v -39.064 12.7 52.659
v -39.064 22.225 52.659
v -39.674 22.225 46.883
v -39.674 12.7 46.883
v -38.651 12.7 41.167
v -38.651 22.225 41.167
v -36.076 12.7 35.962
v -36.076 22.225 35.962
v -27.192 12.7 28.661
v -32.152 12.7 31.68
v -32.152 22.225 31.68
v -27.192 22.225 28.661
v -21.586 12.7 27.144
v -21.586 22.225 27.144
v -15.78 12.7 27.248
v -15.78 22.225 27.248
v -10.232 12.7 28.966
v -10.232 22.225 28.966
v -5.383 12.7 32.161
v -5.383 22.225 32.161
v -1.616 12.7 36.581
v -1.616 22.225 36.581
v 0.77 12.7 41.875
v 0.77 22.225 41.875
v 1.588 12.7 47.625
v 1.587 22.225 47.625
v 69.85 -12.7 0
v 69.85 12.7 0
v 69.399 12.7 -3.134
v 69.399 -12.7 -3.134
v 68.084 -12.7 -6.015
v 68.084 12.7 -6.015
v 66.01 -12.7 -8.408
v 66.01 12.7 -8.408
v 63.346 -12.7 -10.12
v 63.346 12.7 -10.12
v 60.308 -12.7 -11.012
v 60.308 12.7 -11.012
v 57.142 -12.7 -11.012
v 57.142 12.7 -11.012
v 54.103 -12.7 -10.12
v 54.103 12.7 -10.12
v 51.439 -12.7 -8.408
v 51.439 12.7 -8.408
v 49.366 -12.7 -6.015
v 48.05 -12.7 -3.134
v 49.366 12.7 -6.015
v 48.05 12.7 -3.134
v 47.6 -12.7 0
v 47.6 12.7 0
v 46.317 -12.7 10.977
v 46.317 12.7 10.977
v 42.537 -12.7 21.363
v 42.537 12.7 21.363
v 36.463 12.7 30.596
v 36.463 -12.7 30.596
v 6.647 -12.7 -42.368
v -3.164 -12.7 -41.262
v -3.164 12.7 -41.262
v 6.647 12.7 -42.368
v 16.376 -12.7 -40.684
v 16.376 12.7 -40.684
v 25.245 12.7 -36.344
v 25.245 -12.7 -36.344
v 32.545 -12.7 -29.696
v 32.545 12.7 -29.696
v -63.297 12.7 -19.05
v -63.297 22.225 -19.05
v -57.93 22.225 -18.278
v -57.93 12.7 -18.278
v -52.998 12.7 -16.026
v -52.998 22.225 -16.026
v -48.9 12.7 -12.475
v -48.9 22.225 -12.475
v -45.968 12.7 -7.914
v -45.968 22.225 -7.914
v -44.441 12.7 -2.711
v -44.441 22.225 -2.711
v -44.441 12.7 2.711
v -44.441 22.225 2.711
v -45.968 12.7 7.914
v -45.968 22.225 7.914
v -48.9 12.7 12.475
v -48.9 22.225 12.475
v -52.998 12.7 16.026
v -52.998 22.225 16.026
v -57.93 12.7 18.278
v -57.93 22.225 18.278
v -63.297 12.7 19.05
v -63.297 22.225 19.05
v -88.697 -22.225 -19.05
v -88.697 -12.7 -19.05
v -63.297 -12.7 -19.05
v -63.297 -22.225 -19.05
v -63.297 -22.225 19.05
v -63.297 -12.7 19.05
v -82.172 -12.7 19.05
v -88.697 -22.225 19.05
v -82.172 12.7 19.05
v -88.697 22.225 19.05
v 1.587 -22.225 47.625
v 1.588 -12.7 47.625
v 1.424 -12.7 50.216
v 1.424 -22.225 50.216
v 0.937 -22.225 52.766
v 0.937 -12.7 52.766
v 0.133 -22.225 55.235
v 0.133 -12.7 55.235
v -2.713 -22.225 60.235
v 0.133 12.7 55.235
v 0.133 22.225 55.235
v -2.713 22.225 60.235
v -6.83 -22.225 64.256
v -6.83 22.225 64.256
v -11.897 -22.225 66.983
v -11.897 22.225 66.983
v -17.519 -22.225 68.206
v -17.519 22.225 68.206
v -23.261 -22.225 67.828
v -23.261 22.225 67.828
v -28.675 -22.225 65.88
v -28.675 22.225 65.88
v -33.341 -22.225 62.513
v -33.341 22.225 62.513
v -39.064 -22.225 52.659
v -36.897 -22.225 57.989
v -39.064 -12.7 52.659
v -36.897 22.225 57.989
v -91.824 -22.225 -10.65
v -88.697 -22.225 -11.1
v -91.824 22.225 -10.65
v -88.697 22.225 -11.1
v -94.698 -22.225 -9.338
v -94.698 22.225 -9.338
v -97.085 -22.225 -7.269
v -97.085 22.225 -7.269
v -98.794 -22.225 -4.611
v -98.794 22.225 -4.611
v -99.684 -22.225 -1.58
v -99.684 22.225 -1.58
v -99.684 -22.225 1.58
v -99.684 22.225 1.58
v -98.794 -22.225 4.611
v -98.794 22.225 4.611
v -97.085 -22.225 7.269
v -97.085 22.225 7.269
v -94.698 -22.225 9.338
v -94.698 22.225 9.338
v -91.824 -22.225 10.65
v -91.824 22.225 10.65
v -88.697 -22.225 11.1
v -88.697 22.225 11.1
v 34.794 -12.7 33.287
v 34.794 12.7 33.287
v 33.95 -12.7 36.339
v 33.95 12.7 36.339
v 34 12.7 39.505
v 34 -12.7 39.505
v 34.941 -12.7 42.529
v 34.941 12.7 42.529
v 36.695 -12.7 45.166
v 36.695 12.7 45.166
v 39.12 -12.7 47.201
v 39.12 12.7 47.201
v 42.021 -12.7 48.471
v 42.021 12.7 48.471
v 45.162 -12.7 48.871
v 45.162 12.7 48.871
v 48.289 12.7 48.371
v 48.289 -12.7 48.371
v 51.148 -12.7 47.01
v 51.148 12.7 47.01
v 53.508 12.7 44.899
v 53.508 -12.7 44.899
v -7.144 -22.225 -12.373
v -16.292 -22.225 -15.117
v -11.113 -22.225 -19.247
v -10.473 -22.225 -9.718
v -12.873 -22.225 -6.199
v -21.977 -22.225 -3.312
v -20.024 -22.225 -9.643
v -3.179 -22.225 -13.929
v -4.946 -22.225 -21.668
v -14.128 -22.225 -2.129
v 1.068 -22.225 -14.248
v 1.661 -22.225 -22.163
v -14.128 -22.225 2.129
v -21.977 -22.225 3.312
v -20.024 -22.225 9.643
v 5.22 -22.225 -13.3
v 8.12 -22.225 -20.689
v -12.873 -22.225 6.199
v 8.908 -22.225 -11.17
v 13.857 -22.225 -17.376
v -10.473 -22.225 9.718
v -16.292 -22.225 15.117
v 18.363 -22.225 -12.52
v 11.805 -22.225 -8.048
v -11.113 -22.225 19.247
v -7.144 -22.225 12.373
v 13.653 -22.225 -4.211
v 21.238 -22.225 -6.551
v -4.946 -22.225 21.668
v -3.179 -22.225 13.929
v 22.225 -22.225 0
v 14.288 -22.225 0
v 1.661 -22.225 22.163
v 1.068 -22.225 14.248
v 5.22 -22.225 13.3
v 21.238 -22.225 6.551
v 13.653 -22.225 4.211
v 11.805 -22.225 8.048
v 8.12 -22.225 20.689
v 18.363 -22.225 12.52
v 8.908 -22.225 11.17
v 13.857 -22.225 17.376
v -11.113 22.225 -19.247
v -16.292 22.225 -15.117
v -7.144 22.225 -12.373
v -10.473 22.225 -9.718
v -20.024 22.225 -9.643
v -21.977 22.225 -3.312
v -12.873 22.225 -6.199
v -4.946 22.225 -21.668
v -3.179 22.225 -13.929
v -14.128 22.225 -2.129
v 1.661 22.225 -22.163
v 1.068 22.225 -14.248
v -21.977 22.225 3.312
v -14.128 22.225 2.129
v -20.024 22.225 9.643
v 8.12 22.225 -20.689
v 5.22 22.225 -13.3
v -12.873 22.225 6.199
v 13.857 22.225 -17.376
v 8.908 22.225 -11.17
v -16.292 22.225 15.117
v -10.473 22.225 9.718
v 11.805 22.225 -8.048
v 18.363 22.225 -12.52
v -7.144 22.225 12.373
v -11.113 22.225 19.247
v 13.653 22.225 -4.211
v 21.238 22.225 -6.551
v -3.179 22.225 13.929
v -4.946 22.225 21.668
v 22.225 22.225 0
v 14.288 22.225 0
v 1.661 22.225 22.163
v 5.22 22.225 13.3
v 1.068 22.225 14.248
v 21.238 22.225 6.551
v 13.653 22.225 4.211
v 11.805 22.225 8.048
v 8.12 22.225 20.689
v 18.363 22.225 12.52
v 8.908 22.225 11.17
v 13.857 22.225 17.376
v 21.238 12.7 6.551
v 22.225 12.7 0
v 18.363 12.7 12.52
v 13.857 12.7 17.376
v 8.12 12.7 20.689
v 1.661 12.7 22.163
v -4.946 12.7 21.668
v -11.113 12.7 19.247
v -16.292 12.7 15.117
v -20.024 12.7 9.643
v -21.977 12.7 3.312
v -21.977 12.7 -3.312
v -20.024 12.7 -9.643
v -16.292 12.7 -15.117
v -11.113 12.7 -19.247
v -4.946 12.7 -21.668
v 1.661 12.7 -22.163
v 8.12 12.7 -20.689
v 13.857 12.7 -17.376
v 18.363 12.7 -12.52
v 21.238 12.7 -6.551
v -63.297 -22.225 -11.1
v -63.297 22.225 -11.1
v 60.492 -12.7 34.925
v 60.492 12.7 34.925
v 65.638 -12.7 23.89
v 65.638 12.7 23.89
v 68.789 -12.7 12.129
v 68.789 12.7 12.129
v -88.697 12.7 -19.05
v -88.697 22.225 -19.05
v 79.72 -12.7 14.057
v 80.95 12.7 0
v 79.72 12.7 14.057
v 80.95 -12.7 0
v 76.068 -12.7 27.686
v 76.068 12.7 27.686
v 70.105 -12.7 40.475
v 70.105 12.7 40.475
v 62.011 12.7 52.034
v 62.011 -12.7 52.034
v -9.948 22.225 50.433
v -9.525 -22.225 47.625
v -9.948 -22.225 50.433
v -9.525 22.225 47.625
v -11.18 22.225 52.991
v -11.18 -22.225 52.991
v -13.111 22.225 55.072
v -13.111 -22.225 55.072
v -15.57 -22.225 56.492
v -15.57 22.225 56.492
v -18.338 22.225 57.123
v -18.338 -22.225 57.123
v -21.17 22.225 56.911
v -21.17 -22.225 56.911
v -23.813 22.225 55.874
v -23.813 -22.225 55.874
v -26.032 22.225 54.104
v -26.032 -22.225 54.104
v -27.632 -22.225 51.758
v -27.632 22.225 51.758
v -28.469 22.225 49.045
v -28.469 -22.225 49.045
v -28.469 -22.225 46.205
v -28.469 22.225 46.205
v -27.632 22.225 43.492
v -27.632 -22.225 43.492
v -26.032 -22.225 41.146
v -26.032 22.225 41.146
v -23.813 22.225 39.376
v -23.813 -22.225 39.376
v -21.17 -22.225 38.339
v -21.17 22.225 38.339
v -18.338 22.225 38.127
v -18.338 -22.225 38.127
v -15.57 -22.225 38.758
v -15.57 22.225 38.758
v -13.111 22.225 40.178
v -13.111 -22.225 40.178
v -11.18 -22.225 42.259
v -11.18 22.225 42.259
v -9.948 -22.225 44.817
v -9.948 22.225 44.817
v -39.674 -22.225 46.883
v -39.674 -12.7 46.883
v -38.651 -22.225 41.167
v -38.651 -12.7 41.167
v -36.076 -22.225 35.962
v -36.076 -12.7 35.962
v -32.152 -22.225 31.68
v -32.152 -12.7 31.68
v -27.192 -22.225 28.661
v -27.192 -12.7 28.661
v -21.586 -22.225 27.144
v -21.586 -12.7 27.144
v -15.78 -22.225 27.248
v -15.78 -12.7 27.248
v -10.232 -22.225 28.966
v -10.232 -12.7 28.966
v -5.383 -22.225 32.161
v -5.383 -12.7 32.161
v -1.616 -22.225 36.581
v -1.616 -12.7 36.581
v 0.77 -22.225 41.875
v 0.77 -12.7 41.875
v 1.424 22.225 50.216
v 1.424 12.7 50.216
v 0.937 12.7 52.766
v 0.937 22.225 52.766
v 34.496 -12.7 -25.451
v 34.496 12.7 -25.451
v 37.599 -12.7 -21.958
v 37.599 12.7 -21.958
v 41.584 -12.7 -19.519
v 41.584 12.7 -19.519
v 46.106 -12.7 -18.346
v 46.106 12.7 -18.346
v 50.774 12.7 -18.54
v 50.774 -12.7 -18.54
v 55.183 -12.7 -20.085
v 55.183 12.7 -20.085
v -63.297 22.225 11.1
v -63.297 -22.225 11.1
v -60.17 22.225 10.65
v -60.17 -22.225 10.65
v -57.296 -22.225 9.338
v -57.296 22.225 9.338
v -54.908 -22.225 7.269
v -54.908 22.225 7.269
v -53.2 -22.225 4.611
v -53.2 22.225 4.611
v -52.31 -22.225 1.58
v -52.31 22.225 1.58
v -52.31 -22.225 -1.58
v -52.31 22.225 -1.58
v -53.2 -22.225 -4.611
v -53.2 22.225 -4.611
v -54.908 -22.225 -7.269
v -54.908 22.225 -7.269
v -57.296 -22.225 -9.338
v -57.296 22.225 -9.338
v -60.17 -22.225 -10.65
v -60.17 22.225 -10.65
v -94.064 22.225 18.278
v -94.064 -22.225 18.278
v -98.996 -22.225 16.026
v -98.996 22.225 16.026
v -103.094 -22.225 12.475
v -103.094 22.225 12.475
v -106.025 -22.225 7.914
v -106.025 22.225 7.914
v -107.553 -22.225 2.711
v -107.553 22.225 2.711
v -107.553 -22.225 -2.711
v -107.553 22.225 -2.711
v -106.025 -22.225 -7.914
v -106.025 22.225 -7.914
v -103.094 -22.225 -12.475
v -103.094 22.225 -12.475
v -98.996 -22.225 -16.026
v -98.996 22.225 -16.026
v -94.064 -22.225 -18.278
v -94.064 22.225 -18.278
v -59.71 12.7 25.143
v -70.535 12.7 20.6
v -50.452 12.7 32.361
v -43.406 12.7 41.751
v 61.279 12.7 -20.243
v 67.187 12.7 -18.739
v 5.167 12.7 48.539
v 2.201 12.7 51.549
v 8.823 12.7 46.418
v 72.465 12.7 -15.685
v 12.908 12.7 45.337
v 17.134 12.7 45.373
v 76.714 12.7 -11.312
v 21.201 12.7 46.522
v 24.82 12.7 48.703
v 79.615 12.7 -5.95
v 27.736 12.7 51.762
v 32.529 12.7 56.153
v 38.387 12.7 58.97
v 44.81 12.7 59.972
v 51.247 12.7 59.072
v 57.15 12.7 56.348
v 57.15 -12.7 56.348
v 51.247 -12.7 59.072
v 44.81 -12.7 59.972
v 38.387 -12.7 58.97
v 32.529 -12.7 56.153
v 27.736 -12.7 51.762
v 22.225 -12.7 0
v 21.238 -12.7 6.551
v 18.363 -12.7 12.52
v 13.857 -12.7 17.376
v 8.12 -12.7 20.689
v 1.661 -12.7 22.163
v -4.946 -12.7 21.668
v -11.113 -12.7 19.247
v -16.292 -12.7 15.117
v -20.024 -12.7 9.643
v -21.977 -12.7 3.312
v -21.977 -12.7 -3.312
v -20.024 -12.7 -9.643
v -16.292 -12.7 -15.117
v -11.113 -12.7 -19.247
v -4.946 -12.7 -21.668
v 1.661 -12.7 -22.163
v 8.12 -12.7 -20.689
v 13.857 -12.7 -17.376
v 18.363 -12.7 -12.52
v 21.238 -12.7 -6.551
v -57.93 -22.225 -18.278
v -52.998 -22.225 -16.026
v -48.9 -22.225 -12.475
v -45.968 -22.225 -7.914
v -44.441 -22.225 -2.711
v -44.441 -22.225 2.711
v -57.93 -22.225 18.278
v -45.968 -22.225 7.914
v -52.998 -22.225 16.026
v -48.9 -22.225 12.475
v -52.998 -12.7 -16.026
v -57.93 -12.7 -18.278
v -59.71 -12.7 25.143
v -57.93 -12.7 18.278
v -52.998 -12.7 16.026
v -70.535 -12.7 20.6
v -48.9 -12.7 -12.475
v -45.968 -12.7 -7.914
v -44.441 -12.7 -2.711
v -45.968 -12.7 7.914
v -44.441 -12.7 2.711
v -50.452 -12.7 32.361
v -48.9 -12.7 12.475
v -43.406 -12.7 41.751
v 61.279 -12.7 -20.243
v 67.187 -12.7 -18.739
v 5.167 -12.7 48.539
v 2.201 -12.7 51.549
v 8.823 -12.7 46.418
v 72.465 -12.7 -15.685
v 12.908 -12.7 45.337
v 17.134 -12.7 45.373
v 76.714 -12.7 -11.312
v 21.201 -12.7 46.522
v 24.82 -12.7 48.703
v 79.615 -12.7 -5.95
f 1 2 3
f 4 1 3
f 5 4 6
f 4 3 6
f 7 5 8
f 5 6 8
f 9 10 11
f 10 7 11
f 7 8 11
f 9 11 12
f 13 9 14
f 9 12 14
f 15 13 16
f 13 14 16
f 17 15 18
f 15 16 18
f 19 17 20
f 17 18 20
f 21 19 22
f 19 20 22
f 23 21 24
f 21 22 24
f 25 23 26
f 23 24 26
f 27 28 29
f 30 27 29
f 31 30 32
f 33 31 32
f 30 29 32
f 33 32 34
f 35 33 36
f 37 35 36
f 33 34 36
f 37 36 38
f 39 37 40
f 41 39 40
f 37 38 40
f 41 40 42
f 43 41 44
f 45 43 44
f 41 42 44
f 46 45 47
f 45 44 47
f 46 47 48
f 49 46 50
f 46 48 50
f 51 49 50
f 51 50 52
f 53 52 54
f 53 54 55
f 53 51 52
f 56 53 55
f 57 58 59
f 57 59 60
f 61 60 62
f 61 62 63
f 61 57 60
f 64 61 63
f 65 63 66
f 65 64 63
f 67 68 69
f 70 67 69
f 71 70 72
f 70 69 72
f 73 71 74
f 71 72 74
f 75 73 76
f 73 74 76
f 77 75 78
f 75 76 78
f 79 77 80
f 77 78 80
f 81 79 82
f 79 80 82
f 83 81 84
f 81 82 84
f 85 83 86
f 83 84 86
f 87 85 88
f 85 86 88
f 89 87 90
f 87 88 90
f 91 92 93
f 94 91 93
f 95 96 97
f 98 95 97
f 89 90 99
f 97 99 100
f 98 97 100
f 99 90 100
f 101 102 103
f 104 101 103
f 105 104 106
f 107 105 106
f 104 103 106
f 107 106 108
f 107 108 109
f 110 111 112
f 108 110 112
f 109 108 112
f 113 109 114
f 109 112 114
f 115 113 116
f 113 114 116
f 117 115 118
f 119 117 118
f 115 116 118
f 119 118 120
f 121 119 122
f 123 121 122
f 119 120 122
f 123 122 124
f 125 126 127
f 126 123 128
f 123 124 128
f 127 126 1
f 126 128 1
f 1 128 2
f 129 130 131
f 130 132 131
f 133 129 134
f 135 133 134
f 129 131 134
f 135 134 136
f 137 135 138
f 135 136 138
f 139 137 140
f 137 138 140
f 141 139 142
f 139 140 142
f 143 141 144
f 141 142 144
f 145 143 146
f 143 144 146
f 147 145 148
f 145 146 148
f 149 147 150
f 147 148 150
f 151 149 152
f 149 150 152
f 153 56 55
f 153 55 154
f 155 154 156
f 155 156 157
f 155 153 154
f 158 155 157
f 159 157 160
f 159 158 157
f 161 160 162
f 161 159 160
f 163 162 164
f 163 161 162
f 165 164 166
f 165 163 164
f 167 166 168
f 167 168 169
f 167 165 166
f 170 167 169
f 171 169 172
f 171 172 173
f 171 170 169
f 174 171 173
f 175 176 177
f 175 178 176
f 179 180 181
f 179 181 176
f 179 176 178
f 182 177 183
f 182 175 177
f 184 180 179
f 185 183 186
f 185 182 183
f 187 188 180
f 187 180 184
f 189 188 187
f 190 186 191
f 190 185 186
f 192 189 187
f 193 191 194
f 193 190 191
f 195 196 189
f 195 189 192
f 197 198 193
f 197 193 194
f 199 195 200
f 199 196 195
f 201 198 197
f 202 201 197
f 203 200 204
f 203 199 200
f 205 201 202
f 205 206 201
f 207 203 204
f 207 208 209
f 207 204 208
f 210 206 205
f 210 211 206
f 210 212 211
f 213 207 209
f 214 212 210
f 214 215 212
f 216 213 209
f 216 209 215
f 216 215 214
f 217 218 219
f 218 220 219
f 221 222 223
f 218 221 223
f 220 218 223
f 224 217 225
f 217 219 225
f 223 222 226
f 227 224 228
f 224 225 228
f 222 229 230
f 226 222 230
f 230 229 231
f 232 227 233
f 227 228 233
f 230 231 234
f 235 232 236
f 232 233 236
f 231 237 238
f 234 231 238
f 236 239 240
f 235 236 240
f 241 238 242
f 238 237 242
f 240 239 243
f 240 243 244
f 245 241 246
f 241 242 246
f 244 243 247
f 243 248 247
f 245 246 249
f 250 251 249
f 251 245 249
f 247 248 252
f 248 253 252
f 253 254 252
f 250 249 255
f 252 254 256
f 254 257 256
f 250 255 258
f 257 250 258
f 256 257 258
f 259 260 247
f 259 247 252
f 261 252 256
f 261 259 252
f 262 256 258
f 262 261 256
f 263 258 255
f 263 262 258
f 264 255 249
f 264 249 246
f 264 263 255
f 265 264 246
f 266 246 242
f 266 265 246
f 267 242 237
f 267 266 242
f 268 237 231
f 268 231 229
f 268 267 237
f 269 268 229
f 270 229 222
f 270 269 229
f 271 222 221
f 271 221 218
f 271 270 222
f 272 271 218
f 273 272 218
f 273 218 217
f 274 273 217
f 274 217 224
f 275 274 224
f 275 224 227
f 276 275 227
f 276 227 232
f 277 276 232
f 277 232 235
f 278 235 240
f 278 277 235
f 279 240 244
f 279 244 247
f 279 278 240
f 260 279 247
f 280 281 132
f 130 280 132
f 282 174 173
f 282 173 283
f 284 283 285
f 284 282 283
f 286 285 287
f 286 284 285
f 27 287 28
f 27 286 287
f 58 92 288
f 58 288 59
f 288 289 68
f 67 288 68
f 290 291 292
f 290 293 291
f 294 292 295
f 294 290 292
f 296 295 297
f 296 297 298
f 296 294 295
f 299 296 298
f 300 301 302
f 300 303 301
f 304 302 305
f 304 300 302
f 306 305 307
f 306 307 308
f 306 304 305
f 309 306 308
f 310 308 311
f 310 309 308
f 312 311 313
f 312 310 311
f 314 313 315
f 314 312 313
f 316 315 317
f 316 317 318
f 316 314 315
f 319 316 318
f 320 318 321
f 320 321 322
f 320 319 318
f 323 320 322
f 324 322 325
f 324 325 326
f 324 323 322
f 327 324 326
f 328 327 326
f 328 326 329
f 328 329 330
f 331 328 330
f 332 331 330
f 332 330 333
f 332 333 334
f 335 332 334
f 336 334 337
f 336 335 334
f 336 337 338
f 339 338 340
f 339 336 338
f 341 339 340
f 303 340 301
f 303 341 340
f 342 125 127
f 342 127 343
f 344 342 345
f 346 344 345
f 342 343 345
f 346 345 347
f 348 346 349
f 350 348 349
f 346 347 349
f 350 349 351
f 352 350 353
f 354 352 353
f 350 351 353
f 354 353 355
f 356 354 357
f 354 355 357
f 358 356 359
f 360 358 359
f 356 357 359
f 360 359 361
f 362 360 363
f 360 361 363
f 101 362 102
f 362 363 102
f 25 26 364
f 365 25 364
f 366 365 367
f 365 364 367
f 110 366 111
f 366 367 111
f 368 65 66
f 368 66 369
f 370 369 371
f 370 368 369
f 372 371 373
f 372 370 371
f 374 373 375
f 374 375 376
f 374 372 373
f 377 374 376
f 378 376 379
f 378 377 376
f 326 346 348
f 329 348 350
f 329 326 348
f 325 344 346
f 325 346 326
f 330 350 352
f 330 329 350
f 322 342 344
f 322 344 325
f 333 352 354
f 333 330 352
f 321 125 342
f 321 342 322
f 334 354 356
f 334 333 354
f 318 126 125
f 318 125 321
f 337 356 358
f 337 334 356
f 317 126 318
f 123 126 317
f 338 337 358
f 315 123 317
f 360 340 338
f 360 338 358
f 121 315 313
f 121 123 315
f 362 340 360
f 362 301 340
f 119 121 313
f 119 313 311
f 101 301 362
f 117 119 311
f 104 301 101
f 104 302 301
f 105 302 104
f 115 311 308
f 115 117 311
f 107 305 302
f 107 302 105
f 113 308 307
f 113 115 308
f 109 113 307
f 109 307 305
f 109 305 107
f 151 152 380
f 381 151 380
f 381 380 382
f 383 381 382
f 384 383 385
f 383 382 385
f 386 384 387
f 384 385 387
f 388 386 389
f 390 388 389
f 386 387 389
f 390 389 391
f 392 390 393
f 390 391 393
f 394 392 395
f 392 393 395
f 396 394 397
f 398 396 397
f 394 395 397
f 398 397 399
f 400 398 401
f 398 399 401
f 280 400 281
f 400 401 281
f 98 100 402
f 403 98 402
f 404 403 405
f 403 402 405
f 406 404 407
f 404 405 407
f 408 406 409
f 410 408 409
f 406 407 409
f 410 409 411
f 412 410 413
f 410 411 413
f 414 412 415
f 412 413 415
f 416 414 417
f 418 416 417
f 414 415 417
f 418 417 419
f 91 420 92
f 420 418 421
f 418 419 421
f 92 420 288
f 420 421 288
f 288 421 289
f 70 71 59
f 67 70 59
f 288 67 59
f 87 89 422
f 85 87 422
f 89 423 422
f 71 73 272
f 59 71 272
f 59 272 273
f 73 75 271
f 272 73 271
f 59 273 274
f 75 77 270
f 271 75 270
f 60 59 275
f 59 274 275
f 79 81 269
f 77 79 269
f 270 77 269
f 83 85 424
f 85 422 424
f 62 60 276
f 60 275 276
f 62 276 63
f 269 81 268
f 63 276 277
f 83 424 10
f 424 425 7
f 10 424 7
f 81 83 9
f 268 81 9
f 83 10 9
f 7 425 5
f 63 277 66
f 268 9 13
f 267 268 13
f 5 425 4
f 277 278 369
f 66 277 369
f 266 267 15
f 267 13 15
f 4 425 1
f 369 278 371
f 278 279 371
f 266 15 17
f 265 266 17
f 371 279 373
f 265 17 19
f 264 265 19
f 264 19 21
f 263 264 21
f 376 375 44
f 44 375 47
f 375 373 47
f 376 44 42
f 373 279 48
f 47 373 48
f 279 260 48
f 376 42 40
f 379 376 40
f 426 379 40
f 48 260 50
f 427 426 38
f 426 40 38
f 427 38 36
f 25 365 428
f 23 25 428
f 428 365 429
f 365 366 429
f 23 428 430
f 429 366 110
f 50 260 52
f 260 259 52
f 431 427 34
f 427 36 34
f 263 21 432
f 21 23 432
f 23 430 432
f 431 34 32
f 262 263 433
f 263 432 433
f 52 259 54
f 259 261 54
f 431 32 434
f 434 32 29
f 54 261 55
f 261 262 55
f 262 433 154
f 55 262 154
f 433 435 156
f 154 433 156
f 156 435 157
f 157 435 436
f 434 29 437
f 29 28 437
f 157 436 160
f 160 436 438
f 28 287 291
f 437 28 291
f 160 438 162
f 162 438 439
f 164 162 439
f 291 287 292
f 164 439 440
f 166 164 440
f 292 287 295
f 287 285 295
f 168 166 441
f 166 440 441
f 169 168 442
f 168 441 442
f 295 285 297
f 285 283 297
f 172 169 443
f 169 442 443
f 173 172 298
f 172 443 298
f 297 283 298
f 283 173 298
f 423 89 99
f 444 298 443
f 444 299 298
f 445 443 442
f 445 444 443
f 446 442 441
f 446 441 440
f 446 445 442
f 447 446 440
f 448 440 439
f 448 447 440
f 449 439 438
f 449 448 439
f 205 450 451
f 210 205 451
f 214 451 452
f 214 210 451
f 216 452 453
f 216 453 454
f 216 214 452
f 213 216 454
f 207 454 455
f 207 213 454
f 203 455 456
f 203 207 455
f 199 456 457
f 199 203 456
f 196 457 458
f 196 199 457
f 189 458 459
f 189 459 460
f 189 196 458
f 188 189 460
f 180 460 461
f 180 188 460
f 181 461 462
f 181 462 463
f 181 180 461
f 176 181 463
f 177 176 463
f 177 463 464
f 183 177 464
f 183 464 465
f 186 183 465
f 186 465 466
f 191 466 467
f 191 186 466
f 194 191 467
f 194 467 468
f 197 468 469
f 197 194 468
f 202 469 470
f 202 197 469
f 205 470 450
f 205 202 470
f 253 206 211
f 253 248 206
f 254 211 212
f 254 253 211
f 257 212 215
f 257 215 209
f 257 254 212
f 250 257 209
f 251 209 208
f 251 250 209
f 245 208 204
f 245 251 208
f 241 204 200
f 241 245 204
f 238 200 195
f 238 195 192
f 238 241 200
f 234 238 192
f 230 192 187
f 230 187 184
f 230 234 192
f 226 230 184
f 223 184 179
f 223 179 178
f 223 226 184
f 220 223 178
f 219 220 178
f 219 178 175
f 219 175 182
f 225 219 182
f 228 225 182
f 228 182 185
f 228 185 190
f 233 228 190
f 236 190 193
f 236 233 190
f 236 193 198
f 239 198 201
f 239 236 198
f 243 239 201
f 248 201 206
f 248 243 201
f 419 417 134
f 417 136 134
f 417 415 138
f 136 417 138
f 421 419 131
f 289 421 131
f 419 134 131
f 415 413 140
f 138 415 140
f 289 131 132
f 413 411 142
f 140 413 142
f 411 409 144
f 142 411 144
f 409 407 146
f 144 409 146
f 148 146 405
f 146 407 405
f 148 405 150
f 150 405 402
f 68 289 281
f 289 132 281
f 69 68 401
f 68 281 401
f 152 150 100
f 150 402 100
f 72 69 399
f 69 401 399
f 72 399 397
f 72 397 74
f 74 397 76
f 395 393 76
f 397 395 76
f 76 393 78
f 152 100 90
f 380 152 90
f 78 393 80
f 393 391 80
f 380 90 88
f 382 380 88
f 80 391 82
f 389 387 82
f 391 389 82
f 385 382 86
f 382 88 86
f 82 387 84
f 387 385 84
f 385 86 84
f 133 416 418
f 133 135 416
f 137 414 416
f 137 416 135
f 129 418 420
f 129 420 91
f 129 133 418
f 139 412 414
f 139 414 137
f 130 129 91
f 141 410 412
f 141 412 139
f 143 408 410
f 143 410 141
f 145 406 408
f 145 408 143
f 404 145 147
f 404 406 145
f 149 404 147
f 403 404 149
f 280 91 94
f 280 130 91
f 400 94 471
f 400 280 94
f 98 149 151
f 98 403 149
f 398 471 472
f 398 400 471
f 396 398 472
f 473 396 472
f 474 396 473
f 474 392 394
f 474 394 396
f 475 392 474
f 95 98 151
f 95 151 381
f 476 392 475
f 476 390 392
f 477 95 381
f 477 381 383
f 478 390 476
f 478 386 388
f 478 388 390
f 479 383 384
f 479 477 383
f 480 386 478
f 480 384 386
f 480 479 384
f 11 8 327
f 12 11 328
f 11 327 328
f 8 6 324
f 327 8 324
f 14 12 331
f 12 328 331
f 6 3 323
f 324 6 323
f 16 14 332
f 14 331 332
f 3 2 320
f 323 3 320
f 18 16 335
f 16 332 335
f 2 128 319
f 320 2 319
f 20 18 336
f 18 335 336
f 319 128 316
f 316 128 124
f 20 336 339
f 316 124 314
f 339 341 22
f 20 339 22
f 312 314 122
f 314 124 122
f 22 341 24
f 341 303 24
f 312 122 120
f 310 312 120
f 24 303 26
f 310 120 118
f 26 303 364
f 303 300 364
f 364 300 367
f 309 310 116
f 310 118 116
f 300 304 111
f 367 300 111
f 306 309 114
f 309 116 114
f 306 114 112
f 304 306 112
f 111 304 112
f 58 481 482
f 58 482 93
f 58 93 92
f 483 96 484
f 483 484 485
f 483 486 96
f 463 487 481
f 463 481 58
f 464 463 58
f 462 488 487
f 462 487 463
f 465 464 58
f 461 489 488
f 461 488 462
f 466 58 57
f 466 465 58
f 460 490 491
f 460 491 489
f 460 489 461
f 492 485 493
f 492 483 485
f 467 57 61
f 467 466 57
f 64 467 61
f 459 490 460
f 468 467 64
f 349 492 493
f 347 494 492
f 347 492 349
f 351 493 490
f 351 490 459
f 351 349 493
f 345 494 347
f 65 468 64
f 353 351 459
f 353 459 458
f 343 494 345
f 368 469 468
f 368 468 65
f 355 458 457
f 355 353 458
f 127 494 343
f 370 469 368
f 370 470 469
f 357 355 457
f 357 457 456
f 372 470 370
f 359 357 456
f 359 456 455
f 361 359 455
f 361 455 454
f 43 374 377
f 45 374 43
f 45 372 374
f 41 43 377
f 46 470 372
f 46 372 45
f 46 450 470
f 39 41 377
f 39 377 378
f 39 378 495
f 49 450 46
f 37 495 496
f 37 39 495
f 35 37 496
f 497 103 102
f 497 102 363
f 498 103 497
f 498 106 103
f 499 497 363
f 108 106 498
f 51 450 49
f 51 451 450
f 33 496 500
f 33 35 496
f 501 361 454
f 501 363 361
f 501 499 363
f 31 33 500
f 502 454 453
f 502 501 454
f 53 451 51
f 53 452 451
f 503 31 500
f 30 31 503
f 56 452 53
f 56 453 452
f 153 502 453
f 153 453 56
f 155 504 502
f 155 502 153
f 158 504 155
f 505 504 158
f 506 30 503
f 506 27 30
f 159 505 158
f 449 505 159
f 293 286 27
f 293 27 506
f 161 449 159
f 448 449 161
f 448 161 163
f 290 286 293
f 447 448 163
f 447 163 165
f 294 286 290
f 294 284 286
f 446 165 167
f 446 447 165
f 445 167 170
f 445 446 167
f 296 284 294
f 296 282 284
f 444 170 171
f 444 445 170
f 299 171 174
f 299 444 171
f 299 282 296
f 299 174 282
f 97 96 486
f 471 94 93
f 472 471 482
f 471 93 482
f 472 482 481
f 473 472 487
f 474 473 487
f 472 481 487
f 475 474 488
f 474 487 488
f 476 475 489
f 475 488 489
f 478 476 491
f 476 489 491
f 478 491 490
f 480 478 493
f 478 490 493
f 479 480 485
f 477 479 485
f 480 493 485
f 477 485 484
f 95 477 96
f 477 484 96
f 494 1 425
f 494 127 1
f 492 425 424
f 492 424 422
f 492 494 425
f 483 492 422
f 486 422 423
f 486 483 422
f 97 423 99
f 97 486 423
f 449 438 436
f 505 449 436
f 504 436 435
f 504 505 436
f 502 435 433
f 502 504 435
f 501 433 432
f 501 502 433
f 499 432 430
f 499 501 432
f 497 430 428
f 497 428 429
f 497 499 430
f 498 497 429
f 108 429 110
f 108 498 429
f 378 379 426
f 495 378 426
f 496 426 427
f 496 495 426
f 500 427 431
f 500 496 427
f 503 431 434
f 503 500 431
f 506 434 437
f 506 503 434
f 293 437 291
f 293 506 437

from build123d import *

# Parameters (mm, degrees)
F0_R     = 22.225
F1_DEPTH = 12.7
F0_R_2   = 9.525
F0_R_3   = 14.2875
F2_DEPTH = 22.225


with BuildPart() as f1:
    # F0 (on Front) → F1 (new body, symmetric)
    with BuildSketch(Plane.XZ):
        with BuildLine():
            ThreePointArc((-39.064243, 52.658537), (-54.841462, 28.445004), (-82.171843, 19.05))
            Line((-82.171843, 19.05), (-63.2968, 19.05))
            ThreePointArc((-63.2968, 19.05), (-44.2468, 0), (-63.2968, -19.05))
            Line((-63.2968, -19.05), (-88.6968, -19.05))
            Line((-88.6968, -19.05), (-3.164031, -41.261841))
            ThreePointArc((-3.164031, -41.261841), (16.376083, -40.683694), (32.544555, -29.695938))
            ThreePointArc((32.544555, -29.695938), (41.583612, -19.519195), (55.183261, -20.085065))
            ThreePointArc((55.183261, -20.085065), (72.465036, -15.685246), (80.9498, 0))
            ThreePointArc((80.9498, 0), (76.06793, 27.686462), (62.011144, 52.033528))
            ThreePointArc((62.011144, 52.033528), (44.80973, 59.971876), (27.736253, 51.761978))
            ThreePointArc((27.736253, 51.761978), (12.908055, 45.3375), (0.133292, 55.234711))
            ThreePointArc((0.133292, 55.234711), (1.220688, 51.498707), (1.5875, 47.625))
            ThreePointArc((1.5875, 47.625), (-21.585988, 27.143907), (-39.064243, 52.658537))
        make_face()
        Circle(F0_R, mode=Mode.SUBTRACT)
        with BuildLine():
            ThreePointArc((69.85, 0), (58.7248, -11.1252), (47.5996, 0))
            ThreePointArc((47.5996, 0), (44.728993, 16.280022), (36.463409, 30.596433))
            ThreePointArc((36.463409, 30.596433), (37.834666, 46.269971), (53.508204, 44.898715))
            ThreePointArc((53.508204, 44.898715), (65.63753, 23.890107), (69.85, 0))
        make_face(mode=Mode.SUBTRACT)
    extrude(amount=F1_DEPTH, both=True)

    # F0 (on Front) → F2 (join, symmetric)
    with BuildSketch(Plane.XZ):
        with BuildLine():
            ThreePointArc((0.133292, 55.234711), (-20.403436, 68.218072), (-39.064243, 52.658537))
            ThreePointArc((-39.064243, 52.658537), (-21.585988, 27.143907), (1.5875, 47.625))
            ThreePointArc((1.5875, 47.625), (1.220688, 51.498707), (0.133292, 55.234711))
        make_face()
        with Locations((-19.05, 47.625)):
            Circle(F0_R_2, mode=Mode.SUBTRACT)
        with BuildLine():
            Line((-82.171843, 19.05), (-88.6968, 19.05))
            ThreePointArc((-88.6968, 19.05), (-107.7468, 0), (-88.6968, -19.05))
            Line((-88.6968, -19.05), (-63.2968, -19.05))
            ThreePointArc((-63.2968, -19.05), (-44.2468, 0), (-63.2968, 19.05))
            Line((-63.2968, 19.05), (-82.171843, 19.05))
        make_face()
        with BuildLine():
            ThreePointArc((-88.6968, -11.0998), (-99.7966, 0), (-88.6968, 11.0998))
            Line((-88.6968, 11.0998), (-63.2968, 11.0998))
            ThreePointArc((-63.2968, 11.0998), (-52.197, 0), (-63.2968, -11.0998))
            Line((-63.2968, -11.0998), (-88.6968, -11.0998))
        make_face(mode=Mode.SUBTRACT)
        Circle(F0_R)
        Circle(F0_R_3, mode=Mode.SUBTRACT)
    extrude(amount=F2_DEPTH, both=True)


solid = f1.part
